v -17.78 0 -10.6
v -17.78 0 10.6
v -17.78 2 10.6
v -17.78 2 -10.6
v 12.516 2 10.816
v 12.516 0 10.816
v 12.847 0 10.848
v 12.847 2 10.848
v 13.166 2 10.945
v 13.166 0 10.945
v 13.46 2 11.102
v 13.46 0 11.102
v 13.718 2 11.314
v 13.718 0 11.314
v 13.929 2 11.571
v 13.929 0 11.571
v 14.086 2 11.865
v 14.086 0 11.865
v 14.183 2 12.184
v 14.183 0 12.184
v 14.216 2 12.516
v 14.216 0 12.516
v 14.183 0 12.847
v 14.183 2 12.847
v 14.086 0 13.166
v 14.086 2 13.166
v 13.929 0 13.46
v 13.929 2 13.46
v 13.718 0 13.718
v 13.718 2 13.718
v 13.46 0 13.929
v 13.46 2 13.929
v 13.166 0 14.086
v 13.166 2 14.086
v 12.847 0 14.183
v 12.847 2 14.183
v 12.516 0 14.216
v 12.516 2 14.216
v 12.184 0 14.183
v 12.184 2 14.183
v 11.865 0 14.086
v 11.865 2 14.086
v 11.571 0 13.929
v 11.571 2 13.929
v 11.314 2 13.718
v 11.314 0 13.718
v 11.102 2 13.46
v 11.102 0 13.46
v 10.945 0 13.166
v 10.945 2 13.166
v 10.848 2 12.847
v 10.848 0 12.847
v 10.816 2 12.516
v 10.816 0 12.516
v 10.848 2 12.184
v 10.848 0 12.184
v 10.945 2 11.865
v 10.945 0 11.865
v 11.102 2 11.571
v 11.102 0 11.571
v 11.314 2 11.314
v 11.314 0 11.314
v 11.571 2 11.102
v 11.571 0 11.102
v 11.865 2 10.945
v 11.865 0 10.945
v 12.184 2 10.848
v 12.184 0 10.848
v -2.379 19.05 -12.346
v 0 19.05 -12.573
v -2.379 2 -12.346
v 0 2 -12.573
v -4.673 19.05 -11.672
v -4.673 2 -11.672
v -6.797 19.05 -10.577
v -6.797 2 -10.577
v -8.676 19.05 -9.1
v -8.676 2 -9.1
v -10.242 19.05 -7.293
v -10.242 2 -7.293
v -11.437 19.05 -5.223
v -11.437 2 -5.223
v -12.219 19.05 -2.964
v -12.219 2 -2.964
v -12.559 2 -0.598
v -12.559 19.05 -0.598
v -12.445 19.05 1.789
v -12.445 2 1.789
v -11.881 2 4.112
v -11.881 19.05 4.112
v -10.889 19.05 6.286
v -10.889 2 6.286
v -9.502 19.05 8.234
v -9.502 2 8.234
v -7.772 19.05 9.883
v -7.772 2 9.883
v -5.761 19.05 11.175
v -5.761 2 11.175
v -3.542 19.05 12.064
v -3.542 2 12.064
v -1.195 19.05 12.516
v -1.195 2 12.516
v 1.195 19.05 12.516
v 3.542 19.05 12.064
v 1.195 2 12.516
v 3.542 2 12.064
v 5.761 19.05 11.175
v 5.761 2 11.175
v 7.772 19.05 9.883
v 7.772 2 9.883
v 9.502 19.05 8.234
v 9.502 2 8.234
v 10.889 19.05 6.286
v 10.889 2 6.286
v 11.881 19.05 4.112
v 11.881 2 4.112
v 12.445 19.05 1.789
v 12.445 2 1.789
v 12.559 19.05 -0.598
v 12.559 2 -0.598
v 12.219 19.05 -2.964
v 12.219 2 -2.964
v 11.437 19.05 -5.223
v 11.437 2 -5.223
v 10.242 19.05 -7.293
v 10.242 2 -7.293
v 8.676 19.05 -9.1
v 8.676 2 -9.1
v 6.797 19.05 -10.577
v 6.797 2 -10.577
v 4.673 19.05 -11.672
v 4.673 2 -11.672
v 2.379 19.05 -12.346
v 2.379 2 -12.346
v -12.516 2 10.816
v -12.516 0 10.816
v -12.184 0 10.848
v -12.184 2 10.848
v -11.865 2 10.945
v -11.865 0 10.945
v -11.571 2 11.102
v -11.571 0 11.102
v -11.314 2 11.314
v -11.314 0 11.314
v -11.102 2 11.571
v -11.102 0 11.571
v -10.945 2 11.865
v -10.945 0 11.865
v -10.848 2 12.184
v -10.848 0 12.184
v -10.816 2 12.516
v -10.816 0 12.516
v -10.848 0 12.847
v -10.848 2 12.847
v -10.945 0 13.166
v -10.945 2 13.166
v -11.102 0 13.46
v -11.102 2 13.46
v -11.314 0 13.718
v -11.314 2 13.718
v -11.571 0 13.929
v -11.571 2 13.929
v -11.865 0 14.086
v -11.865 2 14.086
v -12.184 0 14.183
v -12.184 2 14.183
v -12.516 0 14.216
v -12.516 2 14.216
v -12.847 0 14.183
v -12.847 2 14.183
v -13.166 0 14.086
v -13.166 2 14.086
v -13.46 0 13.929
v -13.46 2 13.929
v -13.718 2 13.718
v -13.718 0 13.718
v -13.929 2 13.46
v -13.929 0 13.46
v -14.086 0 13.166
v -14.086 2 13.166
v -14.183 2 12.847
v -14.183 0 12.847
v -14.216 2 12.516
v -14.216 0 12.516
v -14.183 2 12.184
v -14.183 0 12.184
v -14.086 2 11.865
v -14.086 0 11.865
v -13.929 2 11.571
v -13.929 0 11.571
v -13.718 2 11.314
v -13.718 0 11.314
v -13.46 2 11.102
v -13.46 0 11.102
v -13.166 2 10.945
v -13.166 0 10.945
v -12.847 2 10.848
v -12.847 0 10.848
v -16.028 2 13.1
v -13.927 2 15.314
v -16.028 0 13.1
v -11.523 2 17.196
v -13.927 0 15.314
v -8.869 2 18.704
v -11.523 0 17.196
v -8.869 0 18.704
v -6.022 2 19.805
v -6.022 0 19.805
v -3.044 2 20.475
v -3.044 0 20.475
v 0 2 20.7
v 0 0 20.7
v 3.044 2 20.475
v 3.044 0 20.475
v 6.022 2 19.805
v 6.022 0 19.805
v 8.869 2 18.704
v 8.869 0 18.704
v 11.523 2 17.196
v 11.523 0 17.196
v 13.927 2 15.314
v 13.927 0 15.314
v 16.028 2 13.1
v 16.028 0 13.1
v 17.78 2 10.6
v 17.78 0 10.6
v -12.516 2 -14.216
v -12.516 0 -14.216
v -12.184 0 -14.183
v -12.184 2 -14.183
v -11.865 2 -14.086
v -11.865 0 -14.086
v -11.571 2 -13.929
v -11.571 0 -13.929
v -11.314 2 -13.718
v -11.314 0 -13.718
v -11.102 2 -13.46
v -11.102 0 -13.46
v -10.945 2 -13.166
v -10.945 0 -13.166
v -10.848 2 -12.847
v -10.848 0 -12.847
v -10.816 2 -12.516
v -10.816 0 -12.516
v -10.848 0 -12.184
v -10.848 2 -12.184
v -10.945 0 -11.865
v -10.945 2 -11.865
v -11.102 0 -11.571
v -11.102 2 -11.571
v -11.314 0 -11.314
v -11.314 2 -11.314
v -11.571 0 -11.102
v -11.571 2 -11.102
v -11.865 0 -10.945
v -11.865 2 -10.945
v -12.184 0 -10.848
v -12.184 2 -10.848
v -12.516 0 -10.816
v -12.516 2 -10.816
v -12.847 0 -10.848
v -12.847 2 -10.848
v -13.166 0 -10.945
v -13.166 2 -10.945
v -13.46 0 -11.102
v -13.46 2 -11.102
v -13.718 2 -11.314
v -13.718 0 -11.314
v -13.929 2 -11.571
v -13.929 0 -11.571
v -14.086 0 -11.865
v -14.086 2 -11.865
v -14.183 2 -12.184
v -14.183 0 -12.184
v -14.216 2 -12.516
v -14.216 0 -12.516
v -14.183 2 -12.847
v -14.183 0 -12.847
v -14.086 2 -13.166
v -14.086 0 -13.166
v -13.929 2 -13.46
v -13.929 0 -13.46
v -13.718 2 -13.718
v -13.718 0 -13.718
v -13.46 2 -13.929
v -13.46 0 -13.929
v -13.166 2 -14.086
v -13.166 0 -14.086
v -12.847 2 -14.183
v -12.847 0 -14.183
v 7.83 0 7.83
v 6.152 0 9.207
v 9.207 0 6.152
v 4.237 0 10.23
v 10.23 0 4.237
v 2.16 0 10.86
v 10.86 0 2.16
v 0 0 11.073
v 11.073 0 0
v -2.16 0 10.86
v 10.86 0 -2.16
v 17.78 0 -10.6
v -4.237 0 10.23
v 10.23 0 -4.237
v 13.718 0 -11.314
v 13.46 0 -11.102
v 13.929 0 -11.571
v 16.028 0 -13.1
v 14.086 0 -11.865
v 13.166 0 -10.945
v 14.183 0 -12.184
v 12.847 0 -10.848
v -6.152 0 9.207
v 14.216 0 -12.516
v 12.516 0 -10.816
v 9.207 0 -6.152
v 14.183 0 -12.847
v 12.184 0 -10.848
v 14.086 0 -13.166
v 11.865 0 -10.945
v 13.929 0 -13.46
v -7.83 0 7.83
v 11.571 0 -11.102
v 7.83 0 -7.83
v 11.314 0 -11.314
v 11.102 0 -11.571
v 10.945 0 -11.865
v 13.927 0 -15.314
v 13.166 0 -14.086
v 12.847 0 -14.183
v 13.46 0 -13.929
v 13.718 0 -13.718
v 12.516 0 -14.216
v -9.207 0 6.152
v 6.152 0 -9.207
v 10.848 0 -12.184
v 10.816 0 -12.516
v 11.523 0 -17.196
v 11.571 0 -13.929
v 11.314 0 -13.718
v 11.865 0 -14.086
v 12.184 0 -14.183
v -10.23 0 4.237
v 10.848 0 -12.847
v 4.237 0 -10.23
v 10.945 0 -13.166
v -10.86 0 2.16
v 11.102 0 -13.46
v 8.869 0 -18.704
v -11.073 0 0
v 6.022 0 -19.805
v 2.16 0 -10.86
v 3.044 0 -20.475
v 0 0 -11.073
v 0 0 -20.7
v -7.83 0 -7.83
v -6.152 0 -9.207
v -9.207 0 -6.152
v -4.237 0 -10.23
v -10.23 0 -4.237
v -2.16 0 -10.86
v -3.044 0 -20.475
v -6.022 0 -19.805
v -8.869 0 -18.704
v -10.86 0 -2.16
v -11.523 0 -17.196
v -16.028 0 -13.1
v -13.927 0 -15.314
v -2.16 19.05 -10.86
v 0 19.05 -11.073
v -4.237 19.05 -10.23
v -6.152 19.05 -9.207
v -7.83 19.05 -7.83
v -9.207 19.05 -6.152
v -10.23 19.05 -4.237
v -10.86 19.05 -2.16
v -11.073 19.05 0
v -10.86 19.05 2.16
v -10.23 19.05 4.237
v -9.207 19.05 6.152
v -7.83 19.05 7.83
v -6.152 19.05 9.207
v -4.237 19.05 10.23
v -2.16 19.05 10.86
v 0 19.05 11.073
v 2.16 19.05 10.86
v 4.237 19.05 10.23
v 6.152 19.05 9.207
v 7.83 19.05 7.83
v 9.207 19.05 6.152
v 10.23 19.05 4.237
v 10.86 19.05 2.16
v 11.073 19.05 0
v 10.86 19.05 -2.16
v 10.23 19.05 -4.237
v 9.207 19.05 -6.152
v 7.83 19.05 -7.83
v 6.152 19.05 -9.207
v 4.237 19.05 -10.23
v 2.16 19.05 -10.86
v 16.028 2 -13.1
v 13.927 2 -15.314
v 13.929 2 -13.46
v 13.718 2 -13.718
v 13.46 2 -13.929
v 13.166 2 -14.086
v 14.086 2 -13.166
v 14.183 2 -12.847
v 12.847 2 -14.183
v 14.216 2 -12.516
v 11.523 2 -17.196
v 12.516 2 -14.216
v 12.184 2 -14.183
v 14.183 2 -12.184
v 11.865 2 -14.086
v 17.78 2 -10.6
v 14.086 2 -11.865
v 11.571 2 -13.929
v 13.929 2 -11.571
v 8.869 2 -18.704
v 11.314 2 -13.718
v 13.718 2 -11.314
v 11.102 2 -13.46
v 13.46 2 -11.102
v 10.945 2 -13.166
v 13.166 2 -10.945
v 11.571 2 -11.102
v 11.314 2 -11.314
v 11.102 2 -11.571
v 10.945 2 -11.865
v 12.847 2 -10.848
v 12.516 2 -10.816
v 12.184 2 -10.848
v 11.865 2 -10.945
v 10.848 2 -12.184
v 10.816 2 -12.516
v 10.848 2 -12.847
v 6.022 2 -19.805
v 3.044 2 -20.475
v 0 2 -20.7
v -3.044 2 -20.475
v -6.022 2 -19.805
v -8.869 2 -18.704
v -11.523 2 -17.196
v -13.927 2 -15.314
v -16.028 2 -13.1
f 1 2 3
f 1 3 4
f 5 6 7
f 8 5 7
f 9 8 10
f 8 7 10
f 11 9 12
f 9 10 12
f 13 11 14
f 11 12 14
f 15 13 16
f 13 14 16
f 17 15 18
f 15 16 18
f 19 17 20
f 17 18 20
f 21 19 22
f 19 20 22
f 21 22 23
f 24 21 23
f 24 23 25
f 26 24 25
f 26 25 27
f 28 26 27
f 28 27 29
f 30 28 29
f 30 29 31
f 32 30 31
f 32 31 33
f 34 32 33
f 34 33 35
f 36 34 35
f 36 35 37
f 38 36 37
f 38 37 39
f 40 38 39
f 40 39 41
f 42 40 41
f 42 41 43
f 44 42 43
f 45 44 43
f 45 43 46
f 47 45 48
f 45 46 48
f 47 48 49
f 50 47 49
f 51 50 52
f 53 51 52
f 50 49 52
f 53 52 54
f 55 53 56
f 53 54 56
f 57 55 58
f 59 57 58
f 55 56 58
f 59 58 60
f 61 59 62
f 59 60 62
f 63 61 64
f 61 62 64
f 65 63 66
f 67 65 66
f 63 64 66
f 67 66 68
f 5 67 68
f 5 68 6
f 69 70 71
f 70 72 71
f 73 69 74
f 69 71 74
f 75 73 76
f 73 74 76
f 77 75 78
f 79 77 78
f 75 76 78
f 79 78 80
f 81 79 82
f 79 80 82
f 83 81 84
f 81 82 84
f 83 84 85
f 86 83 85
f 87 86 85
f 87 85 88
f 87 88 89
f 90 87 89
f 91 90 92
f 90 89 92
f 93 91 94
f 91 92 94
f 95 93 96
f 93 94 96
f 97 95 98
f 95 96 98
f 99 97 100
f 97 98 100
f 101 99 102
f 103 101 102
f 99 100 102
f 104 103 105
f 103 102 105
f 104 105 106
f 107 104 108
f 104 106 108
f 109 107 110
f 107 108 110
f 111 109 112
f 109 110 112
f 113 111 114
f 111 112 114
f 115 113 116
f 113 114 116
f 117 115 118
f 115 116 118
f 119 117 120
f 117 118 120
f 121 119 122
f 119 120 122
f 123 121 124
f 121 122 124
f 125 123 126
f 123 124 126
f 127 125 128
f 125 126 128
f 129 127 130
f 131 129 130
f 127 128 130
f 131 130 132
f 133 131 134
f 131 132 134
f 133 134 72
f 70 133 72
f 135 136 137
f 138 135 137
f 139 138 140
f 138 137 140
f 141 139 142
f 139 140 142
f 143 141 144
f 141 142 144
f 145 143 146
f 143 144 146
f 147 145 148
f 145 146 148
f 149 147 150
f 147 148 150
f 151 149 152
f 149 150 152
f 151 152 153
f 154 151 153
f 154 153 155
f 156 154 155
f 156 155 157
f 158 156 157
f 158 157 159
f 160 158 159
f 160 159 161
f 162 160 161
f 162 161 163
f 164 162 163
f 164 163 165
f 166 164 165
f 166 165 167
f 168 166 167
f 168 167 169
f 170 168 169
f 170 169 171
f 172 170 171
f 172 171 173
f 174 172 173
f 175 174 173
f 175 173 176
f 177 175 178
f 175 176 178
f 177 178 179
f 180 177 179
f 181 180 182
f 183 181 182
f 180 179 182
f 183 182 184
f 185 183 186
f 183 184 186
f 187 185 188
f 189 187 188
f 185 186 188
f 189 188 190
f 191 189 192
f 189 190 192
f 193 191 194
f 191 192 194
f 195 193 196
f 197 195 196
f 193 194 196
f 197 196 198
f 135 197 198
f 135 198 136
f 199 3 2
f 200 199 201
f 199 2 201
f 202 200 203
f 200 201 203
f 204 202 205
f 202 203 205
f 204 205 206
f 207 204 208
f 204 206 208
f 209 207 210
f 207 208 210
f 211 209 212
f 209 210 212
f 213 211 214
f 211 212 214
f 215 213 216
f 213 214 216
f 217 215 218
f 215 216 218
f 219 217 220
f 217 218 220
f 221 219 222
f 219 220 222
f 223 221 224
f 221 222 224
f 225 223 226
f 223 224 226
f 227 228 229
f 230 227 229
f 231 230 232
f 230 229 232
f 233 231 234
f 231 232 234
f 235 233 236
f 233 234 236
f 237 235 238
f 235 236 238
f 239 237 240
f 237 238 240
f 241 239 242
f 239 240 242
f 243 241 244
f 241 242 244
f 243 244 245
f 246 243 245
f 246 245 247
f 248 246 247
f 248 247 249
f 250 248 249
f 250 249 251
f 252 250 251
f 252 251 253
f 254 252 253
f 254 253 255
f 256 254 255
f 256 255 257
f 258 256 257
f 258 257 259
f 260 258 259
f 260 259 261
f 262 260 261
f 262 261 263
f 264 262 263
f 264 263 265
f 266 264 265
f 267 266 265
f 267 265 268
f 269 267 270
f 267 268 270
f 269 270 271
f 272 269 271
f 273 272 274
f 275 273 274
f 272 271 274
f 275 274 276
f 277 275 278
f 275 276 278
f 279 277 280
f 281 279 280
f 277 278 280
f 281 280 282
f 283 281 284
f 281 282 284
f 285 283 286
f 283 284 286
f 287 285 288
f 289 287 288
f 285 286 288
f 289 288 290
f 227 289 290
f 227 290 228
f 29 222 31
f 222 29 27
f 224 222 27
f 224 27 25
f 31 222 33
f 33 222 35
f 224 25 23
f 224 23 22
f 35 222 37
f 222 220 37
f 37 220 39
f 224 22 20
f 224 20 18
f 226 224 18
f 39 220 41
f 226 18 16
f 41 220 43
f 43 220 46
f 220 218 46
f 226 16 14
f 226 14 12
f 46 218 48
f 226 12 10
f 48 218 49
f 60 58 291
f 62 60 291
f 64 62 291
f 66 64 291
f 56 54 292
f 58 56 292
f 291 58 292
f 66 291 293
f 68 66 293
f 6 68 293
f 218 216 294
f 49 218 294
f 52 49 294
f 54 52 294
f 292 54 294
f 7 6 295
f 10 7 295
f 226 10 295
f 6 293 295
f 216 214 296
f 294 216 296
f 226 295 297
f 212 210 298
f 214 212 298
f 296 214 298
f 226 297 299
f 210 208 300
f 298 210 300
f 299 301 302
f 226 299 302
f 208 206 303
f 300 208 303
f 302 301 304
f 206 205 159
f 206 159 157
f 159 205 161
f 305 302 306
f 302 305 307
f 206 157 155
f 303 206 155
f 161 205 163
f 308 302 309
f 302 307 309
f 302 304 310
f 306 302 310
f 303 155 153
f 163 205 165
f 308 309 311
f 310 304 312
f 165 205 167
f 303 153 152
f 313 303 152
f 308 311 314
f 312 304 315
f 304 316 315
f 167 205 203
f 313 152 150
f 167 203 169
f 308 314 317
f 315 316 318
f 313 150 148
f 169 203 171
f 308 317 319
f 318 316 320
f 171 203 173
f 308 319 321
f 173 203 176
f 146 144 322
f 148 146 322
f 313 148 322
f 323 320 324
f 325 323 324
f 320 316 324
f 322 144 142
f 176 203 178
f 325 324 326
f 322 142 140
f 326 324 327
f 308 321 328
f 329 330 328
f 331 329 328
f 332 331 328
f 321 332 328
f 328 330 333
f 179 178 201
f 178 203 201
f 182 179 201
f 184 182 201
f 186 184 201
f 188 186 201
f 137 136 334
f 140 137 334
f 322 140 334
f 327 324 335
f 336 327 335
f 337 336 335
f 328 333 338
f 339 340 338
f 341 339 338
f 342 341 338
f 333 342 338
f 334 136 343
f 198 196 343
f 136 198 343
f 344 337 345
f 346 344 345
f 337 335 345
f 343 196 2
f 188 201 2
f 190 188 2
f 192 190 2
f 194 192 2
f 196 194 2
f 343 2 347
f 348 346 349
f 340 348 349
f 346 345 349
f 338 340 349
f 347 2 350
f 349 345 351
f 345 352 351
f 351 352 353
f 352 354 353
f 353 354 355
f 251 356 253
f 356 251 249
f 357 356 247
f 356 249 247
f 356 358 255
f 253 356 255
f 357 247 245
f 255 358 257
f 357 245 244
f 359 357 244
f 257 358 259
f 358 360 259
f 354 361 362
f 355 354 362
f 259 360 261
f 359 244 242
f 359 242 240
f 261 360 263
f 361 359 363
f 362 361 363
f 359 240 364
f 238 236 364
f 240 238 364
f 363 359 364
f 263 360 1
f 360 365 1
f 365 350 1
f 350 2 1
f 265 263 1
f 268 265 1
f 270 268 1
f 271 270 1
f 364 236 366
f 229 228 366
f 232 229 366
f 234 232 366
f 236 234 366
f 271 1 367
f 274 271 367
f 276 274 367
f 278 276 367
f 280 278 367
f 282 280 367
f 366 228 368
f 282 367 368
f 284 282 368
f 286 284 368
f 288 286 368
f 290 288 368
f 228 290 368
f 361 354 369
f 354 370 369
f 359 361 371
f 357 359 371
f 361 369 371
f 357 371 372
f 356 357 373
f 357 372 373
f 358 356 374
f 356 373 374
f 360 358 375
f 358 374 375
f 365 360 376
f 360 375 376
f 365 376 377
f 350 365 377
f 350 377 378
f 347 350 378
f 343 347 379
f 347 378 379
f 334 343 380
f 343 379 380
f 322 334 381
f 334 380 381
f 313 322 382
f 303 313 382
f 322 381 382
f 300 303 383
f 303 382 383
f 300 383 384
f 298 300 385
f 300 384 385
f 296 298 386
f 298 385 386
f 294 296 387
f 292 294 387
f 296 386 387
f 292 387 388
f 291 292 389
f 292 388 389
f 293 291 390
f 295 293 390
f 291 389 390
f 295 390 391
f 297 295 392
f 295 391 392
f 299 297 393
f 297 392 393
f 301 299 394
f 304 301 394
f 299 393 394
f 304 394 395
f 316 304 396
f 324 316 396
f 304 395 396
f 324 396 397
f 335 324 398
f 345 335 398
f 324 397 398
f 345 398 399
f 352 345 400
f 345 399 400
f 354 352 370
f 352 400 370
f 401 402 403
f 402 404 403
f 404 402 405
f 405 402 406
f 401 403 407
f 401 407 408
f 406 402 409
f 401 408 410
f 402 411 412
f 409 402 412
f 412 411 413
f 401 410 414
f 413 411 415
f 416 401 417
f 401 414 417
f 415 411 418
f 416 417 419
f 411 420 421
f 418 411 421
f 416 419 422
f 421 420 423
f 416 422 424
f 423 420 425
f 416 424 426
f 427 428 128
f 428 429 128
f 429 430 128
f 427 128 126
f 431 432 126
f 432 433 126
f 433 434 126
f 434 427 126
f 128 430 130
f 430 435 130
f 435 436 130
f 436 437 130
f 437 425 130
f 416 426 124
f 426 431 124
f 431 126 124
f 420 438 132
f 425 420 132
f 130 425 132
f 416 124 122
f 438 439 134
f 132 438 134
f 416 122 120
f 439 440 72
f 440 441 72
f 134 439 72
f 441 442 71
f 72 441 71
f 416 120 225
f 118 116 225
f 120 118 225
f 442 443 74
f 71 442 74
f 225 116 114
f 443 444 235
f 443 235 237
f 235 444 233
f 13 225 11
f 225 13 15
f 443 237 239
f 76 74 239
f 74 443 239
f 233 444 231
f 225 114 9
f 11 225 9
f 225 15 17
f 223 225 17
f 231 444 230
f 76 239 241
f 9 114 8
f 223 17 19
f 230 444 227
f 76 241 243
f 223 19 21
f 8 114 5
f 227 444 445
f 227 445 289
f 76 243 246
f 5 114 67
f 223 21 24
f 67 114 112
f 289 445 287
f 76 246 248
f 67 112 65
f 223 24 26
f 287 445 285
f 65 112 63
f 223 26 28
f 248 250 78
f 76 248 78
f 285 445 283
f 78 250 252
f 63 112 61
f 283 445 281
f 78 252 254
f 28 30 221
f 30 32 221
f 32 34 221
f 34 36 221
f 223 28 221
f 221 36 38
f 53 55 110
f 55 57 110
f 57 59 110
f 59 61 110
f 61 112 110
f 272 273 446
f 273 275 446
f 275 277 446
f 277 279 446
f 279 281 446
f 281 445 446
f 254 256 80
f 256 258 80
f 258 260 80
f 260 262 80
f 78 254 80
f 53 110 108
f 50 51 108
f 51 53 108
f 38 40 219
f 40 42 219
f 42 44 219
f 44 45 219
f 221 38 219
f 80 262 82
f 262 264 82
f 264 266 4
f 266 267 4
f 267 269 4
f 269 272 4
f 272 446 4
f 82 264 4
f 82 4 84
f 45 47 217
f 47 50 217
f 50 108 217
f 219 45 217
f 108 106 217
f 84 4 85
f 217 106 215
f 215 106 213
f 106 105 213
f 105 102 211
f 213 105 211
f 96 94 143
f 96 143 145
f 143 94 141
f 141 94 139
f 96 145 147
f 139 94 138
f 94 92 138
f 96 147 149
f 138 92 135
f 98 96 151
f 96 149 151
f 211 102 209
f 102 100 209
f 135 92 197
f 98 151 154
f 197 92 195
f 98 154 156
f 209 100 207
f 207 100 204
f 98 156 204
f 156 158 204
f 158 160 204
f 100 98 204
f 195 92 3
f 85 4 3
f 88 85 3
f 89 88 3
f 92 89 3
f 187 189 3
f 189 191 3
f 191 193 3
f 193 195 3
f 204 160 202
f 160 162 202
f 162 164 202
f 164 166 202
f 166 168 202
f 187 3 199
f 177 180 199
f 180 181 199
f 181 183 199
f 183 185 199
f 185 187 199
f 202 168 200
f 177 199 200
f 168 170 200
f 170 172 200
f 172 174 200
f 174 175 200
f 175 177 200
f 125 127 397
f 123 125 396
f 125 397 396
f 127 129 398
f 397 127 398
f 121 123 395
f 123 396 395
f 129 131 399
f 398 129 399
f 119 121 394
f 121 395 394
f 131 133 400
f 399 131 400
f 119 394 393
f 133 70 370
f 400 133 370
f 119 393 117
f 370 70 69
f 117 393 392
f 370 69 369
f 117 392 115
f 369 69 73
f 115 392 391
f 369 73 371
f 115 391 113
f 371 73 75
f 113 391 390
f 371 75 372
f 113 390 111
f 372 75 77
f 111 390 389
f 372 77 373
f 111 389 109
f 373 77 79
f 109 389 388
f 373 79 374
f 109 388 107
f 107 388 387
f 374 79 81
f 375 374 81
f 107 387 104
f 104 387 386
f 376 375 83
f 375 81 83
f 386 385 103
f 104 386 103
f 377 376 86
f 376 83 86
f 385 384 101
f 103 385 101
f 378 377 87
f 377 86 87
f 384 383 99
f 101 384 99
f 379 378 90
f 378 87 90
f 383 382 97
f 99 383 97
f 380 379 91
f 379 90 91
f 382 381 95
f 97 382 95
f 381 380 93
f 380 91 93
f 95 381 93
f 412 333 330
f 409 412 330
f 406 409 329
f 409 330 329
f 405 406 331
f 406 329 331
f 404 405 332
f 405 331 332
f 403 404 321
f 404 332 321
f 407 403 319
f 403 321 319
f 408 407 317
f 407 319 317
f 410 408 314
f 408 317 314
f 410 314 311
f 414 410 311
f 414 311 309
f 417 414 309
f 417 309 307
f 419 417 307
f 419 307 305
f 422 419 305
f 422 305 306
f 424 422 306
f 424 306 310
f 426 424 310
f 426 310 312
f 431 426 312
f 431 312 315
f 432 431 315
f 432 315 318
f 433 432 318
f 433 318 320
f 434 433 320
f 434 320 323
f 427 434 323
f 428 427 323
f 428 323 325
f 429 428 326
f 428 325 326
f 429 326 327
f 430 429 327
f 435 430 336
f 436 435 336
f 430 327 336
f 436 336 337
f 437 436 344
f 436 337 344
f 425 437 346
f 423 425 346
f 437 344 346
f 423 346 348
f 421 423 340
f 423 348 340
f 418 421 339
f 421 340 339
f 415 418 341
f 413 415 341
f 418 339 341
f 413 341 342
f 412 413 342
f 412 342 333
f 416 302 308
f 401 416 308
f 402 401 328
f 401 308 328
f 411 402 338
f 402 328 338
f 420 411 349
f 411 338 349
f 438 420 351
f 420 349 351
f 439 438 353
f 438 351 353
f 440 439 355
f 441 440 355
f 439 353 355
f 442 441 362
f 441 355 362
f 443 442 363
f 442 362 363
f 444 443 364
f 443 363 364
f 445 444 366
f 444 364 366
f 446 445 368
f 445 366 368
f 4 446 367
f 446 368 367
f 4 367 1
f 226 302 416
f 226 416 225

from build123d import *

# Parameters (mm, degrees)
CUT_EXTRUDE2_DEPTH       = 35.926816345
M3_CLEARANCE_HOLE1_D     = 3.4
M3_CLEARANCE_HOLE1_DEPTH = 12.7


with BuildPart() as part:
    # Sketch1 → Revolve1 (revolve)
    with BuildSketch(Plane.XY, mode=Mode.PRIVATE) as revolve1_sk:
        Polygon((12.573, 2), (20.7, 2), (20.7, 0), (11.073, 0), (11.073, 19.05), (12.573, 19.05), align=None)
    revolve(revolve1_sk.sketch.rotate(Axis((0, 0, 0), (0, 1, 0)), 90), axis=Axis((0, 0, 0), (0, 1, 0)))

    # Sketch3 → Cut-Extrude2 (cut, through all)
    with BuildSketch(Plane.XZ):
        with BuildLine():
            Line((-17.78, 10.600075471), (-17.78, -10.600075471))
            ThreePointArc((-17.78, -10.600075471), (-20.7, 0), (-17.78, 10.600075471))
        make_face()
        with BuildLine():
            Line((17.78, -10.600075471), (17.78, 10.600075471))
            ThreePointArc((17.78, 10.600075471), (20.7, 0), (17.78, -10.600075471))
        make_face()
    extrude(amount=-CUT_EXTRUDE2_DEPTH, mode=Mode.SUBTRACT)

    # M3 Clearance Hole1
    with Locations(Plane(origin=(12.515790027, 2, 12.515790027), x_dir=(0, 0, 1), z_dir=(0, 1, 0))):
        with Locations((0, 0), (0, -25.031580054), (-25.031580054, -25.031580054), (-25.031580054, 0)):
            Hole(M3_CLEARANCE_HOLE1_D / 2, depth=M3_CLEARANCE_HOLE1_DEPTH)


solid = part.part
